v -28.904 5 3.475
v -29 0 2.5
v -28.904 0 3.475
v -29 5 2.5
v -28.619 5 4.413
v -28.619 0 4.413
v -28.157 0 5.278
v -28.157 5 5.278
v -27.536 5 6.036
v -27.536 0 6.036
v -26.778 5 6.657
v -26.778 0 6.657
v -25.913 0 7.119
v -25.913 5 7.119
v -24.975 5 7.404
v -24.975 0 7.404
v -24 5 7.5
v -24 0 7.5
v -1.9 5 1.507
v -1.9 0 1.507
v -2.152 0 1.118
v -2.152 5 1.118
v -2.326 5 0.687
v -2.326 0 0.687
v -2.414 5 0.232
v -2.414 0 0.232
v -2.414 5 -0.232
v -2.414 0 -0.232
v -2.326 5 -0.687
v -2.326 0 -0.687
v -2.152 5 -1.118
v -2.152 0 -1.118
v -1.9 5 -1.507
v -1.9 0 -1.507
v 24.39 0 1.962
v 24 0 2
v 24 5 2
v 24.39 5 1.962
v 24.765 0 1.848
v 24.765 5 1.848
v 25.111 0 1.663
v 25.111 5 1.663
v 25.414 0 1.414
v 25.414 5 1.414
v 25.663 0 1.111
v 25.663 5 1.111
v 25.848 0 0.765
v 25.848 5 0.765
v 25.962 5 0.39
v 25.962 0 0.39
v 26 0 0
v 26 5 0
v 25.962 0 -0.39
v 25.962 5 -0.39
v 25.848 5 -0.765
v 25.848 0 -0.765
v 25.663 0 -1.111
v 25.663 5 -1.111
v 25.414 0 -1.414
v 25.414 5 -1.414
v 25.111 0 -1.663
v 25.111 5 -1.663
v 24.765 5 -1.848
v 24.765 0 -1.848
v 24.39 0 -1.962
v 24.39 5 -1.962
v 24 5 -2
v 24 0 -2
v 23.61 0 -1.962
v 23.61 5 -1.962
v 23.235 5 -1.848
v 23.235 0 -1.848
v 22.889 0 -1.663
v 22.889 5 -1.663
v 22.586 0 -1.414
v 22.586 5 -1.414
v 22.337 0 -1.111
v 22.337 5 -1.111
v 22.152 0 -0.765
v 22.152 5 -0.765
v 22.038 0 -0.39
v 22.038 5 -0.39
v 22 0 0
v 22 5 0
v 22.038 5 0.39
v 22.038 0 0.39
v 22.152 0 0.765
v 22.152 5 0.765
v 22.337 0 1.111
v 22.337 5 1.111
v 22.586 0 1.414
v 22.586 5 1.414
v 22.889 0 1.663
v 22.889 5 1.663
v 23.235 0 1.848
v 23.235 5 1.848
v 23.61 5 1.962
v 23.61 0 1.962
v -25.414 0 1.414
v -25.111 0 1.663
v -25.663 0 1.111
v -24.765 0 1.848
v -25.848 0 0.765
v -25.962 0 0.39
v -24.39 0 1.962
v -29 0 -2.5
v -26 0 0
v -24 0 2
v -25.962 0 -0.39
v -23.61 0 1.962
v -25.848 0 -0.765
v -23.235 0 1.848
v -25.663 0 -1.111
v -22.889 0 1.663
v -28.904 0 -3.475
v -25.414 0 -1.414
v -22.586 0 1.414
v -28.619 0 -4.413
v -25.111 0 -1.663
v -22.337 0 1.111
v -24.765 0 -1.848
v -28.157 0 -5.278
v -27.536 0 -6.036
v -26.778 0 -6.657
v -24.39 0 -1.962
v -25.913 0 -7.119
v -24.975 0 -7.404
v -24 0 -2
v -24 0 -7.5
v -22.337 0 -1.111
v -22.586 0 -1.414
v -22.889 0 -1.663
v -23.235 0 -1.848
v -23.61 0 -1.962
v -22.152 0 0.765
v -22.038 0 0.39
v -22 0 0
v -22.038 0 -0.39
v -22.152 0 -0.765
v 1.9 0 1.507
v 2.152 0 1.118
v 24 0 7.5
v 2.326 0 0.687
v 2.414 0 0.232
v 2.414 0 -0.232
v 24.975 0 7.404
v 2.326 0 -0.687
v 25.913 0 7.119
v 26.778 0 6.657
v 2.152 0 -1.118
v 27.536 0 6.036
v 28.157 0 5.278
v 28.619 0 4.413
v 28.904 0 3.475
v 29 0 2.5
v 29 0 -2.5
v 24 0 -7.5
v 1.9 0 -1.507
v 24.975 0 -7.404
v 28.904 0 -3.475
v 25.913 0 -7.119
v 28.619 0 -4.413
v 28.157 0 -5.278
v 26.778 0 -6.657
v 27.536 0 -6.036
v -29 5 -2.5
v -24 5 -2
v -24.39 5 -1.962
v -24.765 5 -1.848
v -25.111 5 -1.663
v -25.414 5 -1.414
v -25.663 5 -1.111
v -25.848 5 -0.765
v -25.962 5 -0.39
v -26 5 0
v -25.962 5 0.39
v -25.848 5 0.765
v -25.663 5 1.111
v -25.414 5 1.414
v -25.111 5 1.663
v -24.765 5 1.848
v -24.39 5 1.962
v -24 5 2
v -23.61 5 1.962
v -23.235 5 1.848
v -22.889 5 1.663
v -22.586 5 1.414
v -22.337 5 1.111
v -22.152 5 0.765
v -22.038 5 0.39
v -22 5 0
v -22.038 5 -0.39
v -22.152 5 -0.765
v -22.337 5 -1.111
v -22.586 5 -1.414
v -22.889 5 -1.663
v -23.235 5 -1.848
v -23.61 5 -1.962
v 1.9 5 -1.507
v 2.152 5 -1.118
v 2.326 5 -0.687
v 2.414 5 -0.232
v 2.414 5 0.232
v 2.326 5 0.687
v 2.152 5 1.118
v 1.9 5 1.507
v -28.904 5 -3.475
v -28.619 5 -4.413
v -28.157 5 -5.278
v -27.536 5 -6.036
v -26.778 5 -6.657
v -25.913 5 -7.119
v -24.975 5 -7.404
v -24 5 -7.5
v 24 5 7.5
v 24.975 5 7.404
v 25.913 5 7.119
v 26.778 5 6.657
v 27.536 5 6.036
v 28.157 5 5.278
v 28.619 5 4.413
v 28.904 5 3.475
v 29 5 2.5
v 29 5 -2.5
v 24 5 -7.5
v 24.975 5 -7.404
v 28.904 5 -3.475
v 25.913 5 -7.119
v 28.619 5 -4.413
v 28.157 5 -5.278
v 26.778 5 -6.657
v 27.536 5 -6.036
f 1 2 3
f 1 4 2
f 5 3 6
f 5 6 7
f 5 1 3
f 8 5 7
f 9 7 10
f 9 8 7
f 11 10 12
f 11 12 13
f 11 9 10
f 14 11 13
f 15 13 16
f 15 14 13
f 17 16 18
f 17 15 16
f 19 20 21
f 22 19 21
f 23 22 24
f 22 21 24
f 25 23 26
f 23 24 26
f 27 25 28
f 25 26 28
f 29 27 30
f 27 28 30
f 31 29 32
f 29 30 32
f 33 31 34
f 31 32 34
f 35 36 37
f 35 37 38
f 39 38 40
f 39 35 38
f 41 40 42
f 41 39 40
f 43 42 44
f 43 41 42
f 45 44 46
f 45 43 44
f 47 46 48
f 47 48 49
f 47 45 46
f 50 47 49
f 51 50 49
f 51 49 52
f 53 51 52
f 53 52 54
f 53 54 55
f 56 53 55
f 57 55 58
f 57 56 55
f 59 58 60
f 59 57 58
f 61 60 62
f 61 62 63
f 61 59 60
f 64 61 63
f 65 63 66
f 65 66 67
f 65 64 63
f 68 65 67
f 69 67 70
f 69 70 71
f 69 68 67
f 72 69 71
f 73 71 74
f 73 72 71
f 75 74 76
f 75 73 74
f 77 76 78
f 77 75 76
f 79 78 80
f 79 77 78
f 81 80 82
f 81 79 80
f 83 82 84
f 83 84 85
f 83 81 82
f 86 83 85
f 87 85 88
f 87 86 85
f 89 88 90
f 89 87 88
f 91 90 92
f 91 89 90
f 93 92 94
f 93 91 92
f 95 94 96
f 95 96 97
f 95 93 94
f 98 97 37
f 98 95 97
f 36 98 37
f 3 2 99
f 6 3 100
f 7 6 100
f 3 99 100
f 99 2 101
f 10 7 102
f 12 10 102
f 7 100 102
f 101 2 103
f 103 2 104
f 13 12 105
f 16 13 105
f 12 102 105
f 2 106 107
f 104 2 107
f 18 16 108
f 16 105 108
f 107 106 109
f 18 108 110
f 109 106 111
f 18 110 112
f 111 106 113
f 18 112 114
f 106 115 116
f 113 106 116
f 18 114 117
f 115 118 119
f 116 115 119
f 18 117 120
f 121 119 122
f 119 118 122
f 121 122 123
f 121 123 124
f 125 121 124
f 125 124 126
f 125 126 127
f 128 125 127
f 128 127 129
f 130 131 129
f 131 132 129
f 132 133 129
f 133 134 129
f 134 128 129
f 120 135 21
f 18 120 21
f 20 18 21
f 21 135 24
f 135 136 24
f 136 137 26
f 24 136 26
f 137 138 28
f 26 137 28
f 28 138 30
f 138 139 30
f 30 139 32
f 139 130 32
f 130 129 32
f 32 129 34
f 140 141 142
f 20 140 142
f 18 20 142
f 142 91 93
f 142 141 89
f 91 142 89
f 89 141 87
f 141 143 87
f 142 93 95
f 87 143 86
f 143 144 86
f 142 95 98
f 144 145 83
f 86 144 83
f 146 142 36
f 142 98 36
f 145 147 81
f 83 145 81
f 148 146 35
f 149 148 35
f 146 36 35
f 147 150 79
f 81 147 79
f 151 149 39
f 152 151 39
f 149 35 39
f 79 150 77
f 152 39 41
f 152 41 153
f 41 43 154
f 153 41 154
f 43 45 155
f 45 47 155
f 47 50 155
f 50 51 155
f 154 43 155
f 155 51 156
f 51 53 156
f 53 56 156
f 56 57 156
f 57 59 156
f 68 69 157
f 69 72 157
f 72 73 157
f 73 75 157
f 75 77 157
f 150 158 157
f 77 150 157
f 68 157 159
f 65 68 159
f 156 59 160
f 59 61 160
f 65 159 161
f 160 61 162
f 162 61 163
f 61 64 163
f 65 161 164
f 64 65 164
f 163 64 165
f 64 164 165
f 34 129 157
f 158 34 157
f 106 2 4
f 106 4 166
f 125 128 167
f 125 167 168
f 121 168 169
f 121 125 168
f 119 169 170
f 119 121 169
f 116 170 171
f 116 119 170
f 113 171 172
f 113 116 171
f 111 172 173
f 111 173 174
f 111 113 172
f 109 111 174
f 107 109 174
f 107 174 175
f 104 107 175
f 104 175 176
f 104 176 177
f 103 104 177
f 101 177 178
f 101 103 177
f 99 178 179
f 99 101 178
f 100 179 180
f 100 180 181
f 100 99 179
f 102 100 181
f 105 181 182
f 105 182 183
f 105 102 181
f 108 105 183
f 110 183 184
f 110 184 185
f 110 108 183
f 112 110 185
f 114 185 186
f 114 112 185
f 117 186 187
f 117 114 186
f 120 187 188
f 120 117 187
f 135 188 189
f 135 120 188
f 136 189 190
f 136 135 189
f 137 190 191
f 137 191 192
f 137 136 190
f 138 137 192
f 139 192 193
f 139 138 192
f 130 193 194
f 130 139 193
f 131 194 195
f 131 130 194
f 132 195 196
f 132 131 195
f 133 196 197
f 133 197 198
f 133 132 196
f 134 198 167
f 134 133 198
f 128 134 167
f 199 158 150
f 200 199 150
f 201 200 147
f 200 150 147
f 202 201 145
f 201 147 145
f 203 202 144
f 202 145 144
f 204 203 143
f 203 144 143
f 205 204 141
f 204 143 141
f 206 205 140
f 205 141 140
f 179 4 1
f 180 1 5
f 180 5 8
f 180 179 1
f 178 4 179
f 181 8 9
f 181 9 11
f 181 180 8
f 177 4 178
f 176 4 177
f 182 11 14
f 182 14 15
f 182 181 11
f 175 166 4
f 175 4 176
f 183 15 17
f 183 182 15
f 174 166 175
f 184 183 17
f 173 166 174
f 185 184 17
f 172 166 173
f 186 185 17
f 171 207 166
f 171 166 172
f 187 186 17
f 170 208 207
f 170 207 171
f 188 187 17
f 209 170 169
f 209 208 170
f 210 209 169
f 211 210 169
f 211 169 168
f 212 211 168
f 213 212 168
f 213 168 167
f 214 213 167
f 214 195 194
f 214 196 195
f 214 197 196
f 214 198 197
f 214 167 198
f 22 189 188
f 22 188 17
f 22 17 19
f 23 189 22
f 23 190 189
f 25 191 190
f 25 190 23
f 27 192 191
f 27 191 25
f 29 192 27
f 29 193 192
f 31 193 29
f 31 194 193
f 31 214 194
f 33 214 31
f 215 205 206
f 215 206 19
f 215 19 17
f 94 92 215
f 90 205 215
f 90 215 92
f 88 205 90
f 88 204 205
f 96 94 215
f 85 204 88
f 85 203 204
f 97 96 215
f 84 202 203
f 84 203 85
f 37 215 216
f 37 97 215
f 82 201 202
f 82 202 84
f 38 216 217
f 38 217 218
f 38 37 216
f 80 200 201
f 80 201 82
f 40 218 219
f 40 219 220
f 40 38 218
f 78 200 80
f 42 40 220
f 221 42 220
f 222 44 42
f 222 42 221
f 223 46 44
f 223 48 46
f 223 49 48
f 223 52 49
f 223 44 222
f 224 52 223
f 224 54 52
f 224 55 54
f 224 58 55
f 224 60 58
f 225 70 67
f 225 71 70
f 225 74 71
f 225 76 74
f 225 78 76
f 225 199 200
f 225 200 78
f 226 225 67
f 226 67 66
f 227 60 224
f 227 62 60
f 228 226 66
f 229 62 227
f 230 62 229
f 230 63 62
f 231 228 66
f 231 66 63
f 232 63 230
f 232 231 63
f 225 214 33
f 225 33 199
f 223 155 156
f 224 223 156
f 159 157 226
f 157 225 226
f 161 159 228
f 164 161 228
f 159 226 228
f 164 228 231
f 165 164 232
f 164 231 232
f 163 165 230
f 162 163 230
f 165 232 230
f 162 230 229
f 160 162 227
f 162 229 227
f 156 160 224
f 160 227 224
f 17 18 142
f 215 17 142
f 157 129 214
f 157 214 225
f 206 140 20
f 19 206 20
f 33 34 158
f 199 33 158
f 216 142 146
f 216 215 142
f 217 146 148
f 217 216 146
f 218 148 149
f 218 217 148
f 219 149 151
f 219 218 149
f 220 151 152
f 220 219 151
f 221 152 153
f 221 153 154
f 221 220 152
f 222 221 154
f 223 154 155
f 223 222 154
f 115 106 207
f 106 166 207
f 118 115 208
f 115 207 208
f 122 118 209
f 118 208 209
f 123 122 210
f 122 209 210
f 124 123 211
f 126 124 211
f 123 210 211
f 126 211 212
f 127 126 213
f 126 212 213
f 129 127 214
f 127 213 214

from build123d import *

# Parameters (mm, degrees)
SKETCH1_W           = 58
SKETCH1_H           = 15
SKETCH1_R           = 2
BOSS_EXTRUDE1_DEPTH = 5
FILLET1_R           = 5


with BuildPart() as part:
    # Sketch1 → Boss-Extrude1 (new body)
    with BuildSketch(Plane(origin=(0, 0, 0), x_dir=(1, 0, 0), z_dir=(0, 1, 0))):
        Rectangle(SKETCH1_W, SKETCH1_H)
        with Locations(Location((24, 0, 0), (0, 0, 270))):
            Circle(SKETCH1_R, mode=Mode.SUBTRACT)
        with Locations(Location((-24, 0, 0), (0, 0, 90))):
            Circle(SKETCH1_R, mode=Mode.SUBTRACT)
        with BuildLine():
            Line((1.9, -1.506859317), (-1.9, -1.506859317))
            ThreePointArc((-1.9, -1.506859317), (-2.425, 0), (-1.9, 1.506859317))
            Line((-1.9, 1.506859317), (1.9, 1.506859317))
            ThreePointArc((1.9, 1.506859317), (2.425, 0), (1.9, -1.506859317))
        make_face(mode=Mode.SUBTRACT)
    extrude(amount=BOSS_EXTRUDE1_DEPTH)

    # Fillet1
    fillet1_edges = [part.edges().sort_by_distance(p)[0] for p in [
        (29, 2.5, 7.5),
        (-29, 2.5, 7.5),
        (-29, 2.5, -7.5),
        (29, 2.5, -7.5),
    ]]
    fillet(fillet1_edges, radius=FILLET1_R)


solid = part.part
